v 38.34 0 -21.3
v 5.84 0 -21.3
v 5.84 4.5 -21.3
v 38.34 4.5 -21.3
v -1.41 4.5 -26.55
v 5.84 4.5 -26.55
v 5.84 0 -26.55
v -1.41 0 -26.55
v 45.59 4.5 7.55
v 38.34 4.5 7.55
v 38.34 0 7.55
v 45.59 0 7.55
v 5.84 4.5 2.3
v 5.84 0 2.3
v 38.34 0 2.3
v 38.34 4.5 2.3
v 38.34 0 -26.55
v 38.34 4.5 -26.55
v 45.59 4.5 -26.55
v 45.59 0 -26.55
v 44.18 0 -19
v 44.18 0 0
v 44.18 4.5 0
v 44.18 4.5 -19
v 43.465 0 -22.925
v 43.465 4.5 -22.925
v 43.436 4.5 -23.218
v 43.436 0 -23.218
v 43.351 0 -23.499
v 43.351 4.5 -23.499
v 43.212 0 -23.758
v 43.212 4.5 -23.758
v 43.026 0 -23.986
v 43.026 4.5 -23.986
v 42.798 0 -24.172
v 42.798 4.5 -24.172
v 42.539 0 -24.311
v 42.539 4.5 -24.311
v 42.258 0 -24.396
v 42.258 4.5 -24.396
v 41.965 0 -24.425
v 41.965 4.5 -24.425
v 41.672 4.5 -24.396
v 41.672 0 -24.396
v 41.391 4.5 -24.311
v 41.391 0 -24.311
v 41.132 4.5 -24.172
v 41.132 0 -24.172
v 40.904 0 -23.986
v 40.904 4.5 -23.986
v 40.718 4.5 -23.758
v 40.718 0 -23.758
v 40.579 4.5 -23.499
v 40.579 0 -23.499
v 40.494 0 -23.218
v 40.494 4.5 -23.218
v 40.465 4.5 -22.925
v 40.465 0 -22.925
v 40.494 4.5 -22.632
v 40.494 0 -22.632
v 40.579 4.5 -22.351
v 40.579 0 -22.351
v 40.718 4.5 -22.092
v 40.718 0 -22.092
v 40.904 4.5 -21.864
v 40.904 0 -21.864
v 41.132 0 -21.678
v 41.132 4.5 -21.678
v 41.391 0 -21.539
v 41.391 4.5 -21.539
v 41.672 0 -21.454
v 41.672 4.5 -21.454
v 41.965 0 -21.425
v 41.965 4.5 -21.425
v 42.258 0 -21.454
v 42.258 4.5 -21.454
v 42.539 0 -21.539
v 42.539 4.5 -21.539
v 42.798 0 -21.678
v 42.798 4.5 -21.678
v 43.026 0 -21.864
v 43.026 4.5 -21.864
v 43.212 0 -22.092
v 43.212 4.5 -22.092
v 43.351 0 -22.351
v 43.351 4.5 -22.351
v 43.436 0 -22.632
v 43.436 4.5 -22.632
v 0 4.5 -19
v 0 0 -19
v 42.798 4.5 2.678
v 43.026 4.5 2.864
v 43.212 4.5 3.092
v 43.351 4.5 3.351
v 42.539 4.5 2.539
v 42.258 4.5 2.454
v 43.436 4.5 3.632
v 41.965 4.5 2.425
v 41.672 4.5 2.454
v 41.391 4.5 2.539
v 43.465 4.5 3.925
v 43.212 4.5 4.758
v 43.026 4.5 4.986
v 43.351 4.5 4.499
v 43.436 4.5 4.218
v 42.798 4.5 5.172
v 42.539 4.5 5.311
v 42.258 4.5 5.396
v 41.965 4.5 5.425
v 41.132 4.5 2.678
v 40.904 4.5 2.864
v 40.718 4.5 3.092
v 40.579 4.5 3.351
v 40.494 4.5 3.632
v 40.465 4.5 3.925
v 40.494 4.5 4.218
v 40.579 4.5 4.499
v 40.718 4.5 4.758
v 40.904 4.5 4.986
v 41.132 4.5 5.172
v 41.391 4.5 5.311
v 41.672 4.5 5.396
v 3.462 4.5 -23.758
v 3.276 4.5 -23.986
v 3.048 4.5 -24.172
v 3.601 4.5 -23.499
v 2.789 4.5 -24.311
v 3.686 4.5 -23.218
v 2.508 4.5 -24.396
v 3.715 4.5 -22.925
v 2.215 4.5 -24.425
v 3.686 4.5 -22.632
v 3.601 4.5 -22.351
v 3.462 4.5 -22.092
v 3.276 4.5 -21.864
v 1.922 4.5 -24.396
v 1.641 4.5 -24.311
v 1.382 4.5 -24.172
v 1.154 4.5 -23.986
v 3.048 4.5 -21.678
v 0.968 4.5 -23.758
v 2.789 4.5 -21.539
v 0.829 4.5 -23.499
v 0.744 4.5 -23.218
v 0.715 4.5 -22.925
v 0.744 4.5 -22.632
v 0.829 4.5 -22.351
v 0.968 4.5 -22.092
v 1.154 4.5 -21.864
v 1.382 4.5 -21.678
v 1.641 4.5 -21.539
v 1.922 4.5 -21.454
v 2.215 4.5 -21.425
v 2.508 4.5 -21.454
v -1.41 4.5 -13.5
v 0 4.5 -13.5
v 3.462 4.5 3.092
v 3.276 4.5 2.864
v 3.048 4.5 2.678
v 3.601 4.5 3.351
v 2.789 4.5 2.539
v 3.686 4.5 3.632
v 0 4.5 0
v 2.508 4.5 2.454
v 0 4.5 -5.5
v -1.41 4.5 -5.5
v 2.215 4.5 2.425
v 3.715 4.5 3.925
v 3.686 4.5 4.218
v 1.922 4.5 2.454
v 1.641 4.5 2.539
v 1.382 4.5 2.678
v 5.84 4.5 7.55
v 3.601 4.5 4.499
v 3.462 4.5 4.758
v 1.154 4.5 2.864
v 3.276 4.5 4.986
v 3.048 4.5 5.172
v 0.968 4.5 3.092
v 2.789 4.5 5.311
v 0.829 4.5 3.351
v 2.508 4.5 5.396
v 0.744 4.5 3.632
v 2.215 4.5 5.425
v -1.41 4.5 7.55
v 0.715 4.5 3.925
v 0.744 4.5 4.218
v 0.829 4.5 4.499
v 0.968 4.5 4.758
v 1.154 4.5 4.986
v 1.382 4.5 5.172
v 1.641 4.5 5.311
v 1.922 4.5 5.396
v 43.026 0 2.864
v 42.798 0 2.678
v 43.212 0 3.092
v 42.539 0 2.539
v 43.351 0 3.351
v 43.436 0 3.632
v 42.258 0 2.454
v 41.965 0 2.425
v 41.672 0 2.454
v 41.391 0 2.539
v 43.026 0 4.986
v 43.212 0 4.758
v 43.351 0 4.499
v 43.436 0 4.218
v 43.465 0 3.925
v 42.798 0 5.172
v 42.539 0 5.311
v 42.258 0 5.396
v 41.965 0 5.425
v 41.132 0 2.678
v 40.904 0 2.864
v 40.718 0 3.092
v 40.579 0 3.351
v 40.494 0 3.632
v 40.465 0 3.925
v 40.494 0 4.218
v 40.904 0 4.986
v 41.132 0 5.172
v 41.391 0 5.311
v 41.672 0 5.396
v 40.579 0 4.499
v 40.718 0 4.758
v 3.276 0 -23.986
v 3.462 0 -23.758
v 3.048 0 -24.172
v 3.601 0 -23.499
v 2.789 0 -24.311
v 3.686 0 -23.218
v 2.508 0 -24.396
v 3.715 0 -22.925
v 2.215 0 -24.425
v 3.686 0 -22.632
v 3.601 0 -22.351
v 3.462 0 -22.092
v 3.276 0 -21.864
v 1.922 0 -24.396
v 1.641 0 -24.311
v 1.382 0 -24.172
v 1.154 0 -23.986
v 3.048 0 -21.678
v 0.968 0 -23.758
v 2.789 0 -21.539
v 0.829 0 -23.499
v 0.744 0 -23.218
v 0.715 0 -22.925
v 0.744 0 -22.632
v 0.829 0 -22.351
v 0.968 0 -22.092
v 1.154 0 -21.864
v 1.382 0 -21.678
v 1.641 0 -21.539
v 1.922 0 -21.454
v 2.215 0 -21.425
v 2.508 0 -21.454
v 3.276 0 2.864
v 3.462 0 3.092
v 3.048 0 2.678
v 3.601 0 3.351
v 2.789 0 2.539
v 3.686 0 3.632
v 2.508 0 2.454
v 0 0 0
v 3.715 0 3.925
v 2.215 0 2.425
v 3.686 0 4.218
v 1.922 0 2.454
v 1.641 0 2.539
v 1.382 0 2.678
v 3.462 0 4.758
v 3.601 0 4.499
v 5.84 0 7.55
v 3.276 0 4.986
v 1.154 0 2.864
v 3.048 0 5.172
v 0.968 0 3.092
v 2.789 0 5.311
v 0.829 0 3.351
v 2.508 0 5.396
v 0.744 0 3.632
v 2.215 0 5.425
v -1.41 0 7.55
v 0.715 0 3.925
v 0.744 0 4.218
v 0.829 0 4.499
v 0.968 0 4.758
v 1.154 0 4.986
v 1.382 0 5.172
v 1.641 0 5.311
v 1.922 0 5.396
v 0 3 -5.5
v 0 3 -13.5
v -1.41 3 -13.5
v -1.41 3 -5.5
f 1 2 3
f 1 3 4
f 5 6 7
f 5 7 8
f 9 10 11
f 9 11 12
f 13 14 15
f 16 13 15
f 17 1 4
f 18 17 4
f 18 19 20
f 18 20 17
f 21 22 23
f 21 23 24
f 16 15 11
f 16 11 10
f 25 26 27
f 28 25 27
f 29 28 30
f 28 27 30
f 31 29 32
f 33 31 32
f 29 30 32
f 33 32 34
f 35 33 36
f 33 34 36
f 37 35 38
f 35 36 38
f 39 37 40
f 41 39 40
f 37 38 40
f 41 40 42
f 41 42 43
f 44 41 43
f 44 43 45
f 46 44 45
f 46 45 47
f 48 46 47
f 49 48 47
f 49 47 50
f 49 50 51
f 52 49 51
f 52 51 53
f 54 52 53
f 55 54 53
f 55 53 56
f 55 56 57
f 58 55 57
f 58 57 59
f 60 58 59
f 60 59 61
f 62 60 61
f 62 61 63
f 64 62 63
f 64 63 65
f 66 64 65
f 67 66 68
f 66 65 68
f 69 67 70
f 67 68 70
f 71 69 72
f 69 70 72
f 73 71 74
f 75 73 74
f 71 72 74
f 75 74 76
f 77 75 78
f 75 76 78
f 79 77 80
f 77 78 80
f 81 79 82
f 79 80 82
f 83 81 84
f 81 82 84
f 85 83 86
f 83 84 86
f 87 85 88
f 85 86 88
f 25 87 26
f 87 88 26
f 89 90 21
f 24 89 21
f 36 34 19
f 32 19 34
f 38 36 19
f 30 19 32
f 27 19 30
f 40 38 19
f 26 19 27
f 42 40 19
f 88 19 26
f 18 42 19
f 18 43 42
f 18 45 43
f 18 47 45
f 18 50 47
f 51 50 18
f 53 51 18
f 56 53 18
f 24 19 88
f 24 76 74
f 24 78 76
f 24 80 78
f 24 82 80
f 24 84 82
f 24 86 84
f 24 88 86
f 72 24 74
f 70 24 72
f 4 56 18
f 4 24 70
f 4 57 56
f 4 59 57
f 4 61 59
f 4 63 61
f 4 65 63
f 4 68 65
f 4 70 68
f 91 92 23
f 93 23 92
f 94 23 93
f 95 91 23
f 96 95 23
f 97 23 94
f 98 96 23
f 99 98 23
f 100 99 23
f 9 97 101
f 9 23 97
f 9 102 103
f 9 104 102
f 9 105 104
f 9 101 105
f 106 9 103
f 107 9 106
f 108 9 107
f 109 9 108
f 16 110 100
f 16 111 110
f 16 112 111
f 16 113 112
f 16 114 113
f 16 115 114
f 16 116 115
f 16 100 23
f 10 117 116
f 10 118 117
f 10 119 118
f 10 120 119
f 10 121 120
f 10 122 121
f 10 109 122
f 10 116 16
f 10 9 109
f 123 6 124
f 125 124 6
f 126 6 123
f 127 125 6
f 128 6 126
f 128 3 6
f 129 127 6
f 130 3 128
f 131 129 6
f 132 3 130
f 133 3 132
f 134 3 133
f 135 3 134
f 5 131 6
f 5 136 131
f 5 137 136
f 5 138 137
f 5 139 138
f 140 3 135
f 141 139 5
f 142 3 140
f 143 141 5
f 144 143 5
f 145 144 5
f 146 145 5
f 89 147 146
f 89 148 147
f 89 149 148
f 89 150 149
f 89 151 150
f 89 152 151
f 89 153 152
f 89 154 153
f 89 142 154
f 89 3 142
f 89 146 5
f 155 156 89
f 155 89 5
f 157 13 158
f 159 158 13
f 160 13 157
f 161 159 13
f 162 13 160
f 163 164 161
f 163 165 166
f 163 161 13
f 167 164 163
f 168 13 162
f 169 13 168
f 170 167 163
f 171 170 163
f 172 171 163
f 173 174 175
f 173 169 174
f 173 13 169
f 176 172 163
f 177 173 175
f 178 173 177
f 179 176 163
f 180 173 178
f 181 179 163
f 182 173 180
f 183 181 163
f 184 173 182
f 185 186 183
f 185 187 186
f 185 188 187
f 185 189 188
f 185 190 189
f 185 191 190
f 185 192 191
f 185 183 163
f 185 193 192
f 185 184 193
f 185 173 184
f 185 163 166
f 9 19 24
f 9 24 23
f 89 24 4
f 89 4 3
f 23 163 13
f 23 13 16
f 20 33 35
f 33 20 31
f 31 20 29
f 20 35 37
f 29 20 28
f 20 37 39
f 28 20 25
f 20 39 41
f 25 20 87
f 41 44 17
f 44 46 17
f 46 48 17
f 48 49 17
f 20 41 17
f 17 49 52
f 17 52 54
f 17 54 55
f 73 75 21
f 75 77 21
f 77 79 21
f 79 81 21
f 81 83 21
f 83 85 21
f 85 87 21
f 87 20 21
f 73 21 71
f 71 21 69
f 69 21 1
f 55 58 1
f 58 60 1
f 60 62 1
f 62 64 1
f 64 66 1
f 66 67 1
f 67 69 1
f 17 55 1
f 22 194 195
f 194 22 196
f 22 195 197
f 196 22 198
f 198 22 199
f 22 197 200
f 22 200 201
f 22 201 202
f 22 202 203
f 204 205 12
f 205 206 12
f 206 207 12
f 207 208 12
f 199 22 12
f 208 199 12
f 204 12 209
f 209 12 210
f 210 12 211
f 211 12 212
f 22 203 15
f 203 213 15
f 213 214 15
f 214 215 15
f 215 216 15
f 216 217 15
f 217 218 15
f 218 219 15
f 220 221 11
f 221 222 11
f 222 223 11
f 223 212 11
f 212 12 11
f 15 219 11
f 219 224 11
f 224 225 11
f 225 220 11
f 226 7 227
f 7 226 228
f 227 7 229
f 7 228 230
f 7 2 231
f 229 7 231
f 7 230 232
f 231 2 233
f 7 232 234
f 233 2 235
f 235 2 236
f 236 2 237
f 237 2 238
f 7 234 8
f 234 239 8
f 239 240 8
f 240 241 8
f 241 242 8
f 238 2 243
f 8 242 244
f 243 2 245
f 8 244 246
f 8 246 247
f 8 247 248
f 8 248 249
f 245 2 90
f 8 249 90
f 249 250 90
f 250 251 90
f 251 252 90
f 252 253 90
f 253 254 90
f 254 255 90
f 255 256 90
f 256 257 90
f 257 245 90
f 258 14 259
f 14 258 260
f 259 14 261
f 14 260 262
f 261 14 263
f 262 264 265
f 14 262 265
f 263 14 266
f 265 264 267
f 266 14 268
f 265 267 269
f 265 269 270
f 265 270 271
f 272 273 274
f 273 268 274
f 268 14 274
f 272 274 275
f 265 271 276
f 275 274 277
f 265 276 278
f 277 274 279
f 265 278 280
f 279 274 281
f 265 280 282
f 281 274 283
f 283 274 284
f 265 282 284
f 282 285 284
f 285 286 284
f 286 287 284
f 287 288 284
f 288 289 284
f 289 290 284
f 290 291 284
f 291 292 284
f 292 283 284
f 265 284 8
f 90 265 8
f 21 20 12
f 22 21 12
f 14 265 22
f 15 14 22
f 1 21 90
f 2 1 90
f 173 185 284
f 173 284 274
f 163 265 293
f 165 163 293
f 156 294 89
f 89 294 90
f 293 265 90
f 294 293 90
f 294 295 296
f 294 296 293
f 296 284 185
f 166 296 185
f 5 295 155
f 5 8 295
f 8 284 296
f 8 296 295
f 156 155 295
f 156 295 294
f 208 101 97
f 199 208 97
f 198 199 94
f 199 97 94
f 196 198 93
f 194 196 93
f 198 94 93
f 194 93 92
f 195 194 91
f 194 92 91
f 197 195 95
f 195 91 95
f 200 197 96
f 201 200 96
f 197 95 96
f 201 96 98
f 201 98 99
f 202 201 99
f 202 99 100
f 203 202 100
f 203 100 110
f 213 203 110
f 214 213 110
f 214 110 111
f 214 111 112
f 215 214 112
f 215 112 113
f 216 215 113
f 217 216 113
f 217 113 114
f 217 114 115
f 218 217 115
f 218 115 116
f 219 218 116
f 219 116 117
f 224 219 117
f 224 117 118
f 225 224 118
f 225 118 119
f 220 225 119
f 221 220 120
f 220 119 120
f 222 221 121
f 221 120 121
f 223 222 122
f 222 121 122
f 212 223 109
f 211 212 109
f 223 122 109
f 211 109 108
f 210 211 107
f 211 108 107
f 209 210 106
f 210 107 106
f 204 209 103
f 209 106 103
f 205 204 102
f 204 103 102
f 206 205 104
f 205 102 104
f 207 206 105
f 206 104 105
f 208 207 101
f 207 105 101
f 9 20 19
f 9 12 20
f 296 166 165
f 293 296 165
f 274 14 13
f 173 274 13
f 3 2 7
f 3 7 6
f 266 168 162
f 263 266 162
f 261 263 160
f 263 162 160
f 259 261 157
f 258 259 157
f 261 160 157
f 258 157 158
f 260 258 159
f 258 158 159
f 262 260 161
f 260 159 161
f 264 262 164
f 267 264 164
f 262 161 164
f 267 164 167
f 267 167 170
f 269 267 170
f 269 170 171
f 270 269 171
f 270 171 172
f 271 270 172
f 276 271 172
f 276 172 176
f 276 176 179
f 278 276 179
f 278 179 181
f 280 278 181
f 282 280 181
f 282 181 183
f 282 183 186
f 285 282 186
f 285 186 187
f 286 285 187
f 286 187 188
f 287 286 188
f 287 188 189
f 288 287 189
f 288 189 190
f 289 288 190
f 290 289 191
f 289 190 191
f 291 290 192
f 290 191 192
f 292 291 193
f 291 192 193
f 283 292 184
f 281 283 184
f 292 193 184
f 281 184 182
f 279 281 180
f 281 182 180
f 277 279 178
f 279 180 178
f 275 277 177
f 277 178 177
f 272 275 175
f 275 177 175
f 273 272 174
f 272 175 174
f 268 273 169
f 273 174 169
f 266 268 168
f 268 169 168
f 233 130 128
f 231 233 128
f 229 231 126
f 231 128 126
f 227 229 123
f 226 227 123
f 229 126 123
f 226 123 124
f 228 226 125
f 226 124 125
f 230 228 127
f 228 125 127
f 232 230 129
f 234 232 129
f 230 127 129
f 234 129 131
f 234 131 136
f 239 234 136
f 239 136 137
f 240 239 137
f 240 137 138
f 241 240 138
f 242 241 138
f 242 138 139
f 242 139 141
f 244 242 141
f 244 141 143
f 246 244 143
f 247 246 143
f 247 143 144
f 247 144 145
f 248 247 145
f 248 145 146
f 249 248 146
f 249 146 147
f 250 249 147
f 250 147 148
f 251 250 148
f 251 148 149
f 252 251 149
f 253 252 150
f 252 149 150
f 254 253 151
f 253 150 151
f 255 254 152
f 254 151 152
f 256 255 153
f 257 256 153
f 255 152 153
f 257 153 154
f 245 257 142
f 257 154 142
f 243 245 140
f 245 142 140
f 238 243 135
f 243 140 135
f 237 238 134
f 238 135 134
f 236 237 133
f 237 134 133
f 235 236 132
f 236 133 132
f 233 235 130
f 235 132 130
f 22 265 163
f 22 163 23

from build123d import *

# Parameters (mm, degrees)
SKETCH1_W           = 47
SKETCH1_H           = 23.6
SKETCH1_W_2         = 44.18
SKETCH1_H_2         = 19
BOSS_EXTRUDE1_DEPTH = 4.5
SKETCH6_W           = 7.25
SKETCH6_H           = 4.5
BOSS_EXTRUDE3_DEPTH = 5.25
SKETCH7_W           = 7.25
SKETCH7_H           = 4.5
BOSS_EXTRUDE4_DEPTH = 5.25
SKETCH8_R           = 1.5
CUT_EXTRUDE2_DEPTH  = 5.5
SKETCH10_W          = 1.41
SKETCH10_H          = 8
CUT_EXTRUDE3_DEPTH  = 1.5


with BuildPart() as part:
    # Sketch1 → Boss-Extrude1 (new body)
    with BuildSketch(Plane(origin=(0, 0, 0), x_dir=(1, 0, 0), z_dir=(0, 1, 0))):
        with Locations((22.09, 9.5)):
            Rectangle(SKETCH1_W, SKETCH1_H)
        with Locations((22.09, 9.5)):
            Rectangle(SKETCH1_W_2, SKETCH1_H_2, mode=Mode.SUBTRACT)
    extrude(amount=BOSS_EXTRUDE1_DEPTH)

    # Sketch6 → Boss-Extrude3 (add)
    with BuildSketch(Plane.XY.offset(2.3)):
        with Locations((2.215, 2.25)):
            Rectangle(SKETCH6_W, SKETCH6_H)
        with Locations((41.965, 2.25)):
            Rectangle(SKETCH6_W, SKETCH6_H)
    extrude(amount=BOSS_EXTRUDE3_DEPTH)

    # Sketch7 → Boss-Extrude4 (add)
    with BuildSketch(Plane(origin=(0, 0, -21.3), x_dir=(-1, 0, 0), z_dir=(0, 0, -1))):
        with Locations((-41.965, 2.25)):
            Rectangle(SKETCH7_W, SKETCH7_H)
        with Locations((-2.215, 2.25)):
            Rectangle(SKETCH7_W, SKETCH7_H)
    extrude(amount=BOSS_EXTRUDE4_DEPTH)

    # Sketch8 → Cut-Extrude2 (cut, through all)
    with BuildSketch(Plane(origin=(0, 4.5, 0), x_dir=(1, 0, 0), z_dir=(0, 1, 0))):
        with Locations((41.965, 22.925)):
            Circle(SKETCH8_R)
        with Locations((41.965, -3.925)):
            Circle(SKETCH8_R)
        with Locations((2.215, -3.925)):
            Circle(SKETCH8_R)
        with Locations((2.215, 22.925)):
            Circle(SKETCH8_R)
    extrude(amount=-CUT_EXTRUDE2_DEPTH, mode=Mode.SUBTRACT)

    # Sketch10 → Cut-Extrude3 (cut)
    with BuildSketch(Plane(origin=(0, 4.5, 0), x_dir=(1, 0, 0), z_dir=(0, 1, 0))):
        with Locations((-0.705, 9.5)):
            Rectangle(SKETCH10_W, SKETCH10_H)
    extrude(amount=-CUT_EXTRUDE3_DEPTH, mode=Mode.SUBTRACT)


solid = part.part
